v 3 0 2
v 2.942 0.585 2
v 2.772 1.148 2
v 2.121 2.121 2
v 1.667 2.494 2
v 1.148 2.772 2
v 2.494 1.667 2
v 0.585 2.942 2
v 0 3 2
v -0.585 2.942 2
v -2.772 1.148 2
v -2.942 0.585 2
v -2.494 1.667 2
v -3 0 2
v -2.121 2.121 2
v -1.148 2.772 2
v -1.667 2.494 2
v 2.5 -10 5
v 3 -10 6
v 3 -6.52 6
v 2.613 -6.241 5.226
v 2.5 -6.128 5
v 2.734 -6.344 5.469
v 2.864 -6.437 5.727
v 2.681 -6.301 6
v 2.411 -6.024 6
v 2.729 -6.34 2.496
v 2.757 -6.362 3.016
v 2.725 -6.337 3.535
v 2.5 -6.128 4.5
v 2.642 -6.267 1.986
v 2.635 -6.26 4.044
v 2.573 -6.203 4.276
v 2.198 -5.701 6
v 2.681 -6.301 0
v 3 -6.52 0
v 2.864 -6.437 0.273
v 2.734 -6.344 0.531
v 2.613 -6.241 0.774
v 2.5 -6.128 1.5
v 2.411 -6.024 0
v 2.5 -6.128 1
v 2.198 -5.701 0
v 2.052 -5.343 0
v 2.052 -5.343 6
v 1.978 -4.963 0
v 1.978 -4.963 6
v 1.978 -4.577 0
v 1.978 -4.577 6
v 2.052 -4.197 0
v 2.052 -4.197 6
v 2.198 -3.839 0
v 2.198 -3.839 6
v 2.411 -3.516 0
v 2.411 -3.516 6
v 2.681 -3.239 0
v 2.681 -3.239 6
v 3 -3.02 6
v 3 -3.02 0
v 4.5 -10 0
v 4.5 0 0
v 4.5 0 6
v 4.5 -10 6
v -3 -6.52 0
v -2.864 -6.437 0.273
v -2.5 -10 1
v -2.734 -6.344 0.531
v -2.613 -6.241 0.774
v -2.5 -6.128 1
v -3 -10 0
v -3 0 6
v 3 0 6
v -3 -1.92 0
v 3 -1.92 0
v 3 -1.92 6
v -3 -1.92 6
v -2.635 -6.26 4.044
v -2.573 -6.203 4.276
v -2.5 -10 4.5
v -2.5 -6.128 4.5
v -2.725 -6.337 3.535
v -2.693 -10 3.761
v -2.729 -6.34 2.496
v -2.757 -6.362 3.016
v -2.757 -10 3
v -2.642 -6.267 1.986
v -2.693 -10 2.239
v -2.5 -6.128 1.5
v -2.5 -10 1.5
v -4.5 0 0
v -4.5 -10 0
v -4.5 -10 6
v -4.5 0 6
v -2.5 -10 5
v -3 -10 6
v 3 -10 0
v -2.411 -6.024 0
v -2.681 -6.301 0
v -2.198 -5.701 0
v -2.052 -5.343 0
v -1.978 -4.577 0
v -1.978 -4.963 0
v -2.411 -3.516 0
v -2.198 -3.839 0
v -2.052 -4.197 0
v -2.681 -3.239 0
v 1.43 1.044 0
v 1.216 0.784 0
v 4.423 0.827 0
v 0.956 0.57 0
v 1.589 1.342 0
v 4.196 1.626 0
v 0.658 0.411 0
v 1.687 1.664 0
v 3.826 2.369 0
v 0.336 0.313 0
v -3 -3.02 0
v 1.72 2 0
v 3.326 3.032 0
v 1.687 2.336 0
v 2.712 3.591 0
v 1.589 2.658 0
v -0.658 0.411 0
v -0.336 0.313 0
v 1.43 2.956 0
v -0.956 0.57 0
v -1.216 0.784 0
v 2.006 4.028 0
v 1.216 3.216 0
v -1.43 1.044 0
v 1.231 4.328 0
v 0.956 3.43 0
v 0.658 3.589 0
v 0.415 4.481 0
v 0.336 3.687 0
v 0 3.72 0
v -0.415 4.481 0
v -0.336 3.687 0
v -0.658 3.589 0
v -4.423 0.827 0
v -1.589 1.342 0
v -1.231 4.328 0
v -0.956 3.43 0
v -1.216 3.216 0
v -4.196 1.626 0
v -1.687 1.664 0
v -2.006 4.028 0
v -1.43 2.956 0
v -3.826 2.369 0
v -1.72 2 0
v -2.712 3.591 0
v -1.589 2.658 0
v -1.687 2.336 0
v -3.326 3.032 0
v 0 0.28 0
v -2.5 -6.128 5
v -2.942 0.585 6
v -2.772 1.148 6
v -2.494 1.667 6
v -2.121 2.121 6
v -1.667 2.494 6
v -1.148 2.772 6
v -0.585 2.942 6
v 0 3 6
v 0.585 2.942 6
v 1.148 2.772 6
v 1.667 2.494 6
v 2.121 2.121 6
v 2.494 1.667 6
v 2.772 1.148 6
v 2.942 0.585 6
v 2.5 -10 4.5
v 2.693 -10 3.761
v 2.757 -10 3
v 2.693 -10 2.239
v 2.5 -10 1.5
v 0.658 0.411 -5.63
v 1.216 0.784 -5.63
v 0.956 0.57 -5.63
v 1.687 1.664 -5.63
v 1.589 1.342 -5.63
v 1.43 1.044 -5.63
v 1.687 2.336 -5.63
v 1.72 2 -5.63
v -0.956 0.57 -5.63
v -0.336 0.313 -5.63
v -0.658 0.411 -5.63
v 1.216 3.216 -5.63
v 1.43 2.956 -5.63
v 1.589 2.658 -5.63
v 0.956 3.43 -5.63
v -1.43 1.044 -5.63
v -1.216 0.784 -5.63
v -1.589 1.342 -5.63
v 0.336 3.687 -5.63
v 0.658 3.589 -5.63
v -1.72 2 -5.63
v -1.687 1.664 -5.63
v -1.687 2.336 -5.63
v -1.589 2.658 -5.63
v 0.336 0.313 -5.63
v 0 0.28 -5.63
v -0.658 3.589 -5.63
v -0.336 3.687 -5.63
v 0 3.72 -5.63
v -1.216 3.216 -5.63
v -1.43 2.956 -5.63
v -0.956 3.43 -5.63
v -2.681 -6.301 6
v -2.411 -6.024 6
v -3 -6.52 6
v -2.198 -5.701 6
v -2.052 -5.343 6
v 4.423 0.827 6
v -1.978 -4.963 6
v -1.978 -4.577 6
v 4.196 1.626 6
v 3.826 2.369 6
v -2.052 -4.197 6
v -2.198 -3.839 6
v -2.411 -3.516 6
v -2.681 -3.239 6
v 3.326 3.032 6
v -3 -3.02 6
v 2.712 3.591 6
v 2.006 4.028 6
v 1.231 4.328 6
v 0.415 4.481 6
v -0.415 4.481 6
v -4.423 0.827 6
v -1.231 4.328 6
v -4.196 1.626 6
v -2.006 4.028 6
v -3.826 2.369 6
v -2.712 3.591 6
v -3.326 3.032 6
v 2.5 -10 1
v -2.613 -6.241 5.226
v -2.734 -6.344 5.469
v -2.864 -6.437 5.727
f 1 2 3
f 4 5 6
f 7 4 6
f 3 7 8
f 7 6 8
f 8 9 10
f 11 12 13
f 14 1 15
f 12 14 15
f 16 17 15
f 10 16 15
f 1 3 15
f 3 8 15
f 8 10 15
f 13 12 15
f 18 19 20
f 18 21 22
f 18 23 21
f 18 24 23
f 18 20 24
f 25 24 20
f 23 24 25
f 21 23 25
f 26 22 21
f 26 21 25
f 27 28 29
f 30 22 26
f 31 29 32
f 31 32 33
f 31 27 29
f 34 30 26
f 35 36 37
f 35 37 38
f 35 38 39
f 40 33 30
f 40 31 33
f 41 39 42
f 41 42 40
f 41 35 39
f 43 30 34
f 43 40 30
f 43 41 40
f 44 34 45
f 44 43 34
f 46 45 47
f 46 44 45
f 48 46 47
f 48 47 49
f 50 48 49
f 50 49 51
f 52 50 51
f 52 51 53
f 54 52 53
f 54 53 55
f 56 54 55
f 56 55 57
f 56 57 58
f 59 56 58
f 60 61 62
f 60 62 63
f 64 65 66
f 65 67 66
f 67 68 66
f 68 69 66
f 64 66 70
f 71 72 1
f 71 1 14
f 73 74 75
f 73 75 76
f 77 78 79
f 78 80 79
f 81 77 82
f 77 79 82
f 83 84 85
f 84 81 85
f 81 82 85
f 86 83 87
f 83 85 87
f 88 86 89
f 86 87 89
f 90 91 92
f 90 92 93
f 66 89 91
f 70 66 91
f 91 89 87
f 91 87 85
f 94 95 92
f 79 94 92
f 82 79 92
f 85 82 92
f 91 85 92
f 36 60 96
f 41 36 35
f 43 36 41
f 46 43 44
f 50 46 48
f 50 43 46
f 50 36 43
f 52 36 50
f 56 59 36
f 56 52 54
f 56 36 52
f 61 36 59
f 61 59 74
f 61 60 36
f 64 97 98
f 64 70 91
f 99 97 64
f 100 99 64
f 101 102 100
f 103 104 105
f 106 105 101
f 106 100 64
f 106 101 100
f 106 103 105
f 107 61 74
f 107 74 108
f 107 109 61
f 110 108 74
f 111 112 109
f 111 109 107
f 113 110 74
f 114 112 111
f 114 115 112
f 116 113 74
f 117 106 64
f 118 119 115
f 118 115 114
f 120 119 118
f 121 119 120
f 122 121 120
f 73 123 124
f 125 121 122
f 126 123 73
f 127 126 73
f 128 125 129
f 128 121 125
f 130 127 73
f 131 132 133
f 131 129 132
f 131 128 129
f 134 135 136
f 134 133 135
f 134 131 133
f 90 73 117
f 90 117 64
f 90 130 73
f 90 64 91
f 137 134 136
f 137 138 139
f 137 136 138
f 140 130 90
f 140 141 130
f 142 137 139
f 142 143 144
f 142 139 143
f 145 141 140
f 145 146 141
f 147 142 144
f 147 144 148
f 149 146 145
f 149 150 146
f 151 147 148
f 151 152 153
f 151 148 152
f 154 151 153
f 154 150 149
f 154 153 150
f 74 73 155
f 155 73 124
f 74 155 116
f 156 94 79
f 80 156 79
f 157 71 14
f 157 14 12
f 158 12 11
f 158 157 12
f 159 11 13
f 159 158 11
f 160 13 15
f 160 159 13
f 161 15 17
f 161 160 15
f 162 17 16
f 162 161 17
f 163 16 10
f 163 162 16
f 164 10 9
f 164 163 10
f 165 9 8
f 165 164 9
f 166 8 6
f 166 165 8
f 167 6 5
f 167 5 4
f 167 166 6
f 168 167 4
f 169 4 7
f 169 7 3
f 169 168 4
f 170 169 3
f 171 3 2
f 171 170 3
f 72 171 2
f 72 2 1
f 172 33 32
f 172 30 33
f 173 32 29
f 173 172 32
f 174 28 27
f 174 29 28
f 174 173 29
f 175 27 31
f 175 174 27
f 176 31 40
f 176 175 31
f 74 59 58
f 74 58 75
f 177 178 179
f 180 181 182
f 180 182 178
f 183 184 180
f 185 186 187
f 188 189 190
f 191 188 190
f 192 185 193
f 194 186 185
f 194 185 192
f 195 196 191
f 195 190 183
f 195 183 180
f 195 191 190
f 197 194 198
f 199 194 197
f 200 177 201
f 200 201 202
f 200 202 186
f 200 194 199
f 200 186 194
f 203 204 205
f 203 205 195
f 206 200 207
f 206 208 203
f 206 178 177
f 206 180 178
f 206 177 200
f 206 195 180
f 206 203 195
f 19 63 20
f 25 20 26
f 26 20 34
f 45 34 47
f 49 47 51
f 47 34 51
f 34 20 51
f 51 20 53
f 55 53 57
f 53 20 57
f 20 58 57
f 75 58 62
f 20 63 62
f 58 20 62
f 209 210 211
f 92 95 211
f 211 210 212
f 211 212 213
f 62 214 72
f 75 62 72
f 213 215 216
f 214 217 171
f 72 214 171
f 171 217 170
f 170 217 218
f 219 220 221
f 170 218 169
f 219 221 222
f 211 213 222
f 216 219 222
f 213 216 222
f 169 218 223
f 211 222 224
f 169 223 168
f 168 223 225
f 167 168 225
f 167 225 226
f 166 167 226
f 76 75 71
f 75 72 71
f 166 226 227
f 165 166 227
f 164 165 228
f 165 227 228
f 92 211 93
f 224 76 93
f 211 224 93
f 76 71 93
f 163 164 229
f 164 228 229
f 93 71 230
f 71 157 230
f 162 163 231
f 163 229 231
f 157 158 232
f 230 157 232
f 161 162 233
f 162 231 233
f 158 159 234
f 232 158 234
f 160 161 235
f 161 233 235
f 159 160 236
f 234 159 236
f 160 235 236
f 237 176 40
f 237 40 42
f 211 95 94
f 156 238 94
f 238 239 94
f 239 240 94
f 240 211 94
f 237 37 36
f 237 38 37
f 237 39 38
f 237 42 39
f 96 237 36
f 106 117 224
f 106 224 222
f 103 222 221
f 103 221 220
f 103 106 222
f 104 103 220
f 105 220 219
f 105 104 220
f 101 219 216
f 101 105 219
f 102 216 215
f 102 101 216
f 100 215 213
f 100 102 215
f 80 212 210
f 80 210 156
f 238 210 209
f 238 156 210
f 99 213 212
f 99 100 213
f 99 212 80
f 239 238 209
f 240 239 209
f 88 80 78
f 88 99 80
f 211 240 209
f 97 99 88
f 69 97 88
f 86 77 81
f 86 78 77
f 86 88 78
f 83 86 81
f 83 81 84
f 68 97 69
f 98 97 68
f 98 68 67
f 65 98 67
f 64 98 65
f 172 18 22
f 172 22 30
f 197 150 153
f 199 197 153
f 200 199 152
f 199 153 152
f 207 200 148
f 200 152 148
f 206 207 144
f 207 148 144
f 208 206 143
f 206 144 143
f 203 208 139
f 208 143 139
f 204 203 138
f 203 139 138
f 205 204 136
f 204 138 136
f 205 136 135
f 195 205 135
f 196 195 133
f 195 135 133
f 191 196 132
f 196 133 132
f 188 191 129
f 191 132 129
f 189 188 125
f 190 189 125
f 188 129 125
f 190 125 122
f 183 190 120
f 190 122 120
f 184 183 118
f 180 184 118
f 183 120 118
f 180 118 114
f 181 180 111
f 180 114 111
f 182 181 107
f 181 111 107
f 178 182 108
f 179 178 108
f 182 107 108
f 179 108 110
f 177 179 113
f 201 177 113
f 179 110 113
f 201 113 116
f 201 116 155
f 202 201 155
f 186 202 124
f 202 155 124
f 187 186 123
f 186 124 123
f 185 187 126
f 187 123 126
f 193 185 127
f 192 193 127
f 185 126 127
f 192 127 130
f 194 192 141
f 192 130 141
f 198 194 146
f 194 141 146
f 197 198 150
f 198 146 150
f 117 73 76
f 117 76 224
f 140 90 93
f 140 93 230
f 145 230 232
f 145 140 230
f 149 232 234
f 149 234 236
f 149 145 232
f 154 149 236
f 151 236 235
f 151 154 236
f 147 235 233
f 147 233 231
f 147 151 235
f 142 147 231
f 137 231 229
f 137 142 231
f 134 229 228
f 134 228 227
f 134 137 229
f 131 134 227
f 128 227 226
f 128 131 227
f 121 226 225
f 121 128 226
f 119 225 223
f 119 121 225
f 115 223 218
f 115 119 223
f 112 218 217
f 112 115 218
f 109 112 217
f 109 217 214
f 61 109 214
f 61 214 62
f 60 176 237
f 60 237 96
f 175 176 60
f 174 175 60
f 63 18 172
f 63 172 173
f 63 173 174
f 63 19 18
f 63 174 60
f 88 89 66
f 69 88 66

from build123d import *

# Parameters (mm, degrees)
EXTRUDE_1_DEPTH     = 6
CUT_EXTRUDE_1_DEPTH = 4
SKETCH_3_R          = 1.72
EXTRUDE_2_DEPTH     = 5.63
EXTRUDE_5_REACH     = 16.5


with BuildPart() as part:
    # 草图1 → 凸台-拉伸1 (new body)
    with BuildSketch(Plane.XY):
        with BuildLine():
            Line((4.5, 0), (4.5, -10))
            Line((4.5, -10), (3, -10))
            Line((3, -10), (3, -6.52))
            ThreePointArc((3, -6.52), (1.968245837, -4.77), (3, -3.02))
            Line((3, -3.02), (3, -1.92))
            Line((3, -1.92), (-3, -1.92))
            Line((-3, -1.92), (-3, -3.02))
            ThreePointArc((-3, -3.02), (-1.968245837, -4.77), (-3, -6.52))
            Line((-3, -6.52), (-3, -10))
            Line((-3, -10), (-4.5, -10))
            Line((-4.5, -10), (-4.5, 0))
            ThreePointArc((-4.5, 0), (0, 4.5), (4.5, 0))
        make_face()
    extrude(amount=EXTRUDE_1_DEPTH)

    # 草图2 → 切除-拉伸1 (cut)
    with BuildSketch(Plane.XY.offset(6)):
        with BuildLine():
            Line((3, 0), (-3, 0))
            ThreePointArc((-3, 0), (0, 3), (3, 0))
        make_face()
    extrude(amount=-CUT_EXTRUDE_1_DEPTH, mode=Mode.SUBTRACT)

    # 草图3 → 凸台-拉伸2 (add)
    with BuildSketch(Plane(origin=(0, 0, 0), x_dir=(-1, 0, 0), z_dir=(0, 0, -1))):
        with Locations((0, 2)):
            Circle(SKETCH_3_R)
    extrude(amount=EXTRUDE_2_DEPTH)

    # 草图4 → 凸台-拉伸5 (add, up to next)
    with BuildSketch(Plane.XZ.offset(10), mode=Mode.PRIVATE) as extrude_5_sk1:
        with BuildLine():
            Line((-3, 0), (-3, 6))
            Line((-3, 6), (-2.5, 5))
            Line((-2.5, 5), (-2.5, 4.5))
            ThreePointArc((-2.5, 4.5), (-2.757359313, 3), (-2.5, 1.5))
            Line((-2.5, 1.5), (-2.5, 1))
            Line((-2.5, 1), (-3, 0))
        make_face()
    extrude_5_tool1 = extrude(extrude_5_sk1.sketch, amount=-EXTRUDE_5_REACH, mode=Mode.PRIVATE) - part.part
    add(extrude_5_tool1.solids().sort_by_distance((-2.809362, -10, 3))[0])
    # 草图4 → 凸台-拉伸5 (add, up to next)
    with BuildSketch(Plane.XZ.offset(10), mode=Mode.PRIVATE) as extrude_5_sk2:
        with BuildLine():
            Line((2.5, 5), (2.5, 4.5))
            ThreePointArc((2.5, 4.5), (2.757359313, 3), (2.5, 1.5))
            Line((2.5, 1.5), (2.5, 1))
            Line((2.5, 1), (3, 0))
            Line((3, 0), (3, 6))
            Line((3, 6), (2.5, 5))
        make_face()
    extrude_5_tool2 = extrude(extrude_5_sk2.sketch, amount=-EXTRUDE_5_REACH, mode=Mode.PRIVATE) - part.part
    add(extrude_5_tool2.solids().sort_by_distance((2.809362, -10, 3))[0])


solid = part.part
